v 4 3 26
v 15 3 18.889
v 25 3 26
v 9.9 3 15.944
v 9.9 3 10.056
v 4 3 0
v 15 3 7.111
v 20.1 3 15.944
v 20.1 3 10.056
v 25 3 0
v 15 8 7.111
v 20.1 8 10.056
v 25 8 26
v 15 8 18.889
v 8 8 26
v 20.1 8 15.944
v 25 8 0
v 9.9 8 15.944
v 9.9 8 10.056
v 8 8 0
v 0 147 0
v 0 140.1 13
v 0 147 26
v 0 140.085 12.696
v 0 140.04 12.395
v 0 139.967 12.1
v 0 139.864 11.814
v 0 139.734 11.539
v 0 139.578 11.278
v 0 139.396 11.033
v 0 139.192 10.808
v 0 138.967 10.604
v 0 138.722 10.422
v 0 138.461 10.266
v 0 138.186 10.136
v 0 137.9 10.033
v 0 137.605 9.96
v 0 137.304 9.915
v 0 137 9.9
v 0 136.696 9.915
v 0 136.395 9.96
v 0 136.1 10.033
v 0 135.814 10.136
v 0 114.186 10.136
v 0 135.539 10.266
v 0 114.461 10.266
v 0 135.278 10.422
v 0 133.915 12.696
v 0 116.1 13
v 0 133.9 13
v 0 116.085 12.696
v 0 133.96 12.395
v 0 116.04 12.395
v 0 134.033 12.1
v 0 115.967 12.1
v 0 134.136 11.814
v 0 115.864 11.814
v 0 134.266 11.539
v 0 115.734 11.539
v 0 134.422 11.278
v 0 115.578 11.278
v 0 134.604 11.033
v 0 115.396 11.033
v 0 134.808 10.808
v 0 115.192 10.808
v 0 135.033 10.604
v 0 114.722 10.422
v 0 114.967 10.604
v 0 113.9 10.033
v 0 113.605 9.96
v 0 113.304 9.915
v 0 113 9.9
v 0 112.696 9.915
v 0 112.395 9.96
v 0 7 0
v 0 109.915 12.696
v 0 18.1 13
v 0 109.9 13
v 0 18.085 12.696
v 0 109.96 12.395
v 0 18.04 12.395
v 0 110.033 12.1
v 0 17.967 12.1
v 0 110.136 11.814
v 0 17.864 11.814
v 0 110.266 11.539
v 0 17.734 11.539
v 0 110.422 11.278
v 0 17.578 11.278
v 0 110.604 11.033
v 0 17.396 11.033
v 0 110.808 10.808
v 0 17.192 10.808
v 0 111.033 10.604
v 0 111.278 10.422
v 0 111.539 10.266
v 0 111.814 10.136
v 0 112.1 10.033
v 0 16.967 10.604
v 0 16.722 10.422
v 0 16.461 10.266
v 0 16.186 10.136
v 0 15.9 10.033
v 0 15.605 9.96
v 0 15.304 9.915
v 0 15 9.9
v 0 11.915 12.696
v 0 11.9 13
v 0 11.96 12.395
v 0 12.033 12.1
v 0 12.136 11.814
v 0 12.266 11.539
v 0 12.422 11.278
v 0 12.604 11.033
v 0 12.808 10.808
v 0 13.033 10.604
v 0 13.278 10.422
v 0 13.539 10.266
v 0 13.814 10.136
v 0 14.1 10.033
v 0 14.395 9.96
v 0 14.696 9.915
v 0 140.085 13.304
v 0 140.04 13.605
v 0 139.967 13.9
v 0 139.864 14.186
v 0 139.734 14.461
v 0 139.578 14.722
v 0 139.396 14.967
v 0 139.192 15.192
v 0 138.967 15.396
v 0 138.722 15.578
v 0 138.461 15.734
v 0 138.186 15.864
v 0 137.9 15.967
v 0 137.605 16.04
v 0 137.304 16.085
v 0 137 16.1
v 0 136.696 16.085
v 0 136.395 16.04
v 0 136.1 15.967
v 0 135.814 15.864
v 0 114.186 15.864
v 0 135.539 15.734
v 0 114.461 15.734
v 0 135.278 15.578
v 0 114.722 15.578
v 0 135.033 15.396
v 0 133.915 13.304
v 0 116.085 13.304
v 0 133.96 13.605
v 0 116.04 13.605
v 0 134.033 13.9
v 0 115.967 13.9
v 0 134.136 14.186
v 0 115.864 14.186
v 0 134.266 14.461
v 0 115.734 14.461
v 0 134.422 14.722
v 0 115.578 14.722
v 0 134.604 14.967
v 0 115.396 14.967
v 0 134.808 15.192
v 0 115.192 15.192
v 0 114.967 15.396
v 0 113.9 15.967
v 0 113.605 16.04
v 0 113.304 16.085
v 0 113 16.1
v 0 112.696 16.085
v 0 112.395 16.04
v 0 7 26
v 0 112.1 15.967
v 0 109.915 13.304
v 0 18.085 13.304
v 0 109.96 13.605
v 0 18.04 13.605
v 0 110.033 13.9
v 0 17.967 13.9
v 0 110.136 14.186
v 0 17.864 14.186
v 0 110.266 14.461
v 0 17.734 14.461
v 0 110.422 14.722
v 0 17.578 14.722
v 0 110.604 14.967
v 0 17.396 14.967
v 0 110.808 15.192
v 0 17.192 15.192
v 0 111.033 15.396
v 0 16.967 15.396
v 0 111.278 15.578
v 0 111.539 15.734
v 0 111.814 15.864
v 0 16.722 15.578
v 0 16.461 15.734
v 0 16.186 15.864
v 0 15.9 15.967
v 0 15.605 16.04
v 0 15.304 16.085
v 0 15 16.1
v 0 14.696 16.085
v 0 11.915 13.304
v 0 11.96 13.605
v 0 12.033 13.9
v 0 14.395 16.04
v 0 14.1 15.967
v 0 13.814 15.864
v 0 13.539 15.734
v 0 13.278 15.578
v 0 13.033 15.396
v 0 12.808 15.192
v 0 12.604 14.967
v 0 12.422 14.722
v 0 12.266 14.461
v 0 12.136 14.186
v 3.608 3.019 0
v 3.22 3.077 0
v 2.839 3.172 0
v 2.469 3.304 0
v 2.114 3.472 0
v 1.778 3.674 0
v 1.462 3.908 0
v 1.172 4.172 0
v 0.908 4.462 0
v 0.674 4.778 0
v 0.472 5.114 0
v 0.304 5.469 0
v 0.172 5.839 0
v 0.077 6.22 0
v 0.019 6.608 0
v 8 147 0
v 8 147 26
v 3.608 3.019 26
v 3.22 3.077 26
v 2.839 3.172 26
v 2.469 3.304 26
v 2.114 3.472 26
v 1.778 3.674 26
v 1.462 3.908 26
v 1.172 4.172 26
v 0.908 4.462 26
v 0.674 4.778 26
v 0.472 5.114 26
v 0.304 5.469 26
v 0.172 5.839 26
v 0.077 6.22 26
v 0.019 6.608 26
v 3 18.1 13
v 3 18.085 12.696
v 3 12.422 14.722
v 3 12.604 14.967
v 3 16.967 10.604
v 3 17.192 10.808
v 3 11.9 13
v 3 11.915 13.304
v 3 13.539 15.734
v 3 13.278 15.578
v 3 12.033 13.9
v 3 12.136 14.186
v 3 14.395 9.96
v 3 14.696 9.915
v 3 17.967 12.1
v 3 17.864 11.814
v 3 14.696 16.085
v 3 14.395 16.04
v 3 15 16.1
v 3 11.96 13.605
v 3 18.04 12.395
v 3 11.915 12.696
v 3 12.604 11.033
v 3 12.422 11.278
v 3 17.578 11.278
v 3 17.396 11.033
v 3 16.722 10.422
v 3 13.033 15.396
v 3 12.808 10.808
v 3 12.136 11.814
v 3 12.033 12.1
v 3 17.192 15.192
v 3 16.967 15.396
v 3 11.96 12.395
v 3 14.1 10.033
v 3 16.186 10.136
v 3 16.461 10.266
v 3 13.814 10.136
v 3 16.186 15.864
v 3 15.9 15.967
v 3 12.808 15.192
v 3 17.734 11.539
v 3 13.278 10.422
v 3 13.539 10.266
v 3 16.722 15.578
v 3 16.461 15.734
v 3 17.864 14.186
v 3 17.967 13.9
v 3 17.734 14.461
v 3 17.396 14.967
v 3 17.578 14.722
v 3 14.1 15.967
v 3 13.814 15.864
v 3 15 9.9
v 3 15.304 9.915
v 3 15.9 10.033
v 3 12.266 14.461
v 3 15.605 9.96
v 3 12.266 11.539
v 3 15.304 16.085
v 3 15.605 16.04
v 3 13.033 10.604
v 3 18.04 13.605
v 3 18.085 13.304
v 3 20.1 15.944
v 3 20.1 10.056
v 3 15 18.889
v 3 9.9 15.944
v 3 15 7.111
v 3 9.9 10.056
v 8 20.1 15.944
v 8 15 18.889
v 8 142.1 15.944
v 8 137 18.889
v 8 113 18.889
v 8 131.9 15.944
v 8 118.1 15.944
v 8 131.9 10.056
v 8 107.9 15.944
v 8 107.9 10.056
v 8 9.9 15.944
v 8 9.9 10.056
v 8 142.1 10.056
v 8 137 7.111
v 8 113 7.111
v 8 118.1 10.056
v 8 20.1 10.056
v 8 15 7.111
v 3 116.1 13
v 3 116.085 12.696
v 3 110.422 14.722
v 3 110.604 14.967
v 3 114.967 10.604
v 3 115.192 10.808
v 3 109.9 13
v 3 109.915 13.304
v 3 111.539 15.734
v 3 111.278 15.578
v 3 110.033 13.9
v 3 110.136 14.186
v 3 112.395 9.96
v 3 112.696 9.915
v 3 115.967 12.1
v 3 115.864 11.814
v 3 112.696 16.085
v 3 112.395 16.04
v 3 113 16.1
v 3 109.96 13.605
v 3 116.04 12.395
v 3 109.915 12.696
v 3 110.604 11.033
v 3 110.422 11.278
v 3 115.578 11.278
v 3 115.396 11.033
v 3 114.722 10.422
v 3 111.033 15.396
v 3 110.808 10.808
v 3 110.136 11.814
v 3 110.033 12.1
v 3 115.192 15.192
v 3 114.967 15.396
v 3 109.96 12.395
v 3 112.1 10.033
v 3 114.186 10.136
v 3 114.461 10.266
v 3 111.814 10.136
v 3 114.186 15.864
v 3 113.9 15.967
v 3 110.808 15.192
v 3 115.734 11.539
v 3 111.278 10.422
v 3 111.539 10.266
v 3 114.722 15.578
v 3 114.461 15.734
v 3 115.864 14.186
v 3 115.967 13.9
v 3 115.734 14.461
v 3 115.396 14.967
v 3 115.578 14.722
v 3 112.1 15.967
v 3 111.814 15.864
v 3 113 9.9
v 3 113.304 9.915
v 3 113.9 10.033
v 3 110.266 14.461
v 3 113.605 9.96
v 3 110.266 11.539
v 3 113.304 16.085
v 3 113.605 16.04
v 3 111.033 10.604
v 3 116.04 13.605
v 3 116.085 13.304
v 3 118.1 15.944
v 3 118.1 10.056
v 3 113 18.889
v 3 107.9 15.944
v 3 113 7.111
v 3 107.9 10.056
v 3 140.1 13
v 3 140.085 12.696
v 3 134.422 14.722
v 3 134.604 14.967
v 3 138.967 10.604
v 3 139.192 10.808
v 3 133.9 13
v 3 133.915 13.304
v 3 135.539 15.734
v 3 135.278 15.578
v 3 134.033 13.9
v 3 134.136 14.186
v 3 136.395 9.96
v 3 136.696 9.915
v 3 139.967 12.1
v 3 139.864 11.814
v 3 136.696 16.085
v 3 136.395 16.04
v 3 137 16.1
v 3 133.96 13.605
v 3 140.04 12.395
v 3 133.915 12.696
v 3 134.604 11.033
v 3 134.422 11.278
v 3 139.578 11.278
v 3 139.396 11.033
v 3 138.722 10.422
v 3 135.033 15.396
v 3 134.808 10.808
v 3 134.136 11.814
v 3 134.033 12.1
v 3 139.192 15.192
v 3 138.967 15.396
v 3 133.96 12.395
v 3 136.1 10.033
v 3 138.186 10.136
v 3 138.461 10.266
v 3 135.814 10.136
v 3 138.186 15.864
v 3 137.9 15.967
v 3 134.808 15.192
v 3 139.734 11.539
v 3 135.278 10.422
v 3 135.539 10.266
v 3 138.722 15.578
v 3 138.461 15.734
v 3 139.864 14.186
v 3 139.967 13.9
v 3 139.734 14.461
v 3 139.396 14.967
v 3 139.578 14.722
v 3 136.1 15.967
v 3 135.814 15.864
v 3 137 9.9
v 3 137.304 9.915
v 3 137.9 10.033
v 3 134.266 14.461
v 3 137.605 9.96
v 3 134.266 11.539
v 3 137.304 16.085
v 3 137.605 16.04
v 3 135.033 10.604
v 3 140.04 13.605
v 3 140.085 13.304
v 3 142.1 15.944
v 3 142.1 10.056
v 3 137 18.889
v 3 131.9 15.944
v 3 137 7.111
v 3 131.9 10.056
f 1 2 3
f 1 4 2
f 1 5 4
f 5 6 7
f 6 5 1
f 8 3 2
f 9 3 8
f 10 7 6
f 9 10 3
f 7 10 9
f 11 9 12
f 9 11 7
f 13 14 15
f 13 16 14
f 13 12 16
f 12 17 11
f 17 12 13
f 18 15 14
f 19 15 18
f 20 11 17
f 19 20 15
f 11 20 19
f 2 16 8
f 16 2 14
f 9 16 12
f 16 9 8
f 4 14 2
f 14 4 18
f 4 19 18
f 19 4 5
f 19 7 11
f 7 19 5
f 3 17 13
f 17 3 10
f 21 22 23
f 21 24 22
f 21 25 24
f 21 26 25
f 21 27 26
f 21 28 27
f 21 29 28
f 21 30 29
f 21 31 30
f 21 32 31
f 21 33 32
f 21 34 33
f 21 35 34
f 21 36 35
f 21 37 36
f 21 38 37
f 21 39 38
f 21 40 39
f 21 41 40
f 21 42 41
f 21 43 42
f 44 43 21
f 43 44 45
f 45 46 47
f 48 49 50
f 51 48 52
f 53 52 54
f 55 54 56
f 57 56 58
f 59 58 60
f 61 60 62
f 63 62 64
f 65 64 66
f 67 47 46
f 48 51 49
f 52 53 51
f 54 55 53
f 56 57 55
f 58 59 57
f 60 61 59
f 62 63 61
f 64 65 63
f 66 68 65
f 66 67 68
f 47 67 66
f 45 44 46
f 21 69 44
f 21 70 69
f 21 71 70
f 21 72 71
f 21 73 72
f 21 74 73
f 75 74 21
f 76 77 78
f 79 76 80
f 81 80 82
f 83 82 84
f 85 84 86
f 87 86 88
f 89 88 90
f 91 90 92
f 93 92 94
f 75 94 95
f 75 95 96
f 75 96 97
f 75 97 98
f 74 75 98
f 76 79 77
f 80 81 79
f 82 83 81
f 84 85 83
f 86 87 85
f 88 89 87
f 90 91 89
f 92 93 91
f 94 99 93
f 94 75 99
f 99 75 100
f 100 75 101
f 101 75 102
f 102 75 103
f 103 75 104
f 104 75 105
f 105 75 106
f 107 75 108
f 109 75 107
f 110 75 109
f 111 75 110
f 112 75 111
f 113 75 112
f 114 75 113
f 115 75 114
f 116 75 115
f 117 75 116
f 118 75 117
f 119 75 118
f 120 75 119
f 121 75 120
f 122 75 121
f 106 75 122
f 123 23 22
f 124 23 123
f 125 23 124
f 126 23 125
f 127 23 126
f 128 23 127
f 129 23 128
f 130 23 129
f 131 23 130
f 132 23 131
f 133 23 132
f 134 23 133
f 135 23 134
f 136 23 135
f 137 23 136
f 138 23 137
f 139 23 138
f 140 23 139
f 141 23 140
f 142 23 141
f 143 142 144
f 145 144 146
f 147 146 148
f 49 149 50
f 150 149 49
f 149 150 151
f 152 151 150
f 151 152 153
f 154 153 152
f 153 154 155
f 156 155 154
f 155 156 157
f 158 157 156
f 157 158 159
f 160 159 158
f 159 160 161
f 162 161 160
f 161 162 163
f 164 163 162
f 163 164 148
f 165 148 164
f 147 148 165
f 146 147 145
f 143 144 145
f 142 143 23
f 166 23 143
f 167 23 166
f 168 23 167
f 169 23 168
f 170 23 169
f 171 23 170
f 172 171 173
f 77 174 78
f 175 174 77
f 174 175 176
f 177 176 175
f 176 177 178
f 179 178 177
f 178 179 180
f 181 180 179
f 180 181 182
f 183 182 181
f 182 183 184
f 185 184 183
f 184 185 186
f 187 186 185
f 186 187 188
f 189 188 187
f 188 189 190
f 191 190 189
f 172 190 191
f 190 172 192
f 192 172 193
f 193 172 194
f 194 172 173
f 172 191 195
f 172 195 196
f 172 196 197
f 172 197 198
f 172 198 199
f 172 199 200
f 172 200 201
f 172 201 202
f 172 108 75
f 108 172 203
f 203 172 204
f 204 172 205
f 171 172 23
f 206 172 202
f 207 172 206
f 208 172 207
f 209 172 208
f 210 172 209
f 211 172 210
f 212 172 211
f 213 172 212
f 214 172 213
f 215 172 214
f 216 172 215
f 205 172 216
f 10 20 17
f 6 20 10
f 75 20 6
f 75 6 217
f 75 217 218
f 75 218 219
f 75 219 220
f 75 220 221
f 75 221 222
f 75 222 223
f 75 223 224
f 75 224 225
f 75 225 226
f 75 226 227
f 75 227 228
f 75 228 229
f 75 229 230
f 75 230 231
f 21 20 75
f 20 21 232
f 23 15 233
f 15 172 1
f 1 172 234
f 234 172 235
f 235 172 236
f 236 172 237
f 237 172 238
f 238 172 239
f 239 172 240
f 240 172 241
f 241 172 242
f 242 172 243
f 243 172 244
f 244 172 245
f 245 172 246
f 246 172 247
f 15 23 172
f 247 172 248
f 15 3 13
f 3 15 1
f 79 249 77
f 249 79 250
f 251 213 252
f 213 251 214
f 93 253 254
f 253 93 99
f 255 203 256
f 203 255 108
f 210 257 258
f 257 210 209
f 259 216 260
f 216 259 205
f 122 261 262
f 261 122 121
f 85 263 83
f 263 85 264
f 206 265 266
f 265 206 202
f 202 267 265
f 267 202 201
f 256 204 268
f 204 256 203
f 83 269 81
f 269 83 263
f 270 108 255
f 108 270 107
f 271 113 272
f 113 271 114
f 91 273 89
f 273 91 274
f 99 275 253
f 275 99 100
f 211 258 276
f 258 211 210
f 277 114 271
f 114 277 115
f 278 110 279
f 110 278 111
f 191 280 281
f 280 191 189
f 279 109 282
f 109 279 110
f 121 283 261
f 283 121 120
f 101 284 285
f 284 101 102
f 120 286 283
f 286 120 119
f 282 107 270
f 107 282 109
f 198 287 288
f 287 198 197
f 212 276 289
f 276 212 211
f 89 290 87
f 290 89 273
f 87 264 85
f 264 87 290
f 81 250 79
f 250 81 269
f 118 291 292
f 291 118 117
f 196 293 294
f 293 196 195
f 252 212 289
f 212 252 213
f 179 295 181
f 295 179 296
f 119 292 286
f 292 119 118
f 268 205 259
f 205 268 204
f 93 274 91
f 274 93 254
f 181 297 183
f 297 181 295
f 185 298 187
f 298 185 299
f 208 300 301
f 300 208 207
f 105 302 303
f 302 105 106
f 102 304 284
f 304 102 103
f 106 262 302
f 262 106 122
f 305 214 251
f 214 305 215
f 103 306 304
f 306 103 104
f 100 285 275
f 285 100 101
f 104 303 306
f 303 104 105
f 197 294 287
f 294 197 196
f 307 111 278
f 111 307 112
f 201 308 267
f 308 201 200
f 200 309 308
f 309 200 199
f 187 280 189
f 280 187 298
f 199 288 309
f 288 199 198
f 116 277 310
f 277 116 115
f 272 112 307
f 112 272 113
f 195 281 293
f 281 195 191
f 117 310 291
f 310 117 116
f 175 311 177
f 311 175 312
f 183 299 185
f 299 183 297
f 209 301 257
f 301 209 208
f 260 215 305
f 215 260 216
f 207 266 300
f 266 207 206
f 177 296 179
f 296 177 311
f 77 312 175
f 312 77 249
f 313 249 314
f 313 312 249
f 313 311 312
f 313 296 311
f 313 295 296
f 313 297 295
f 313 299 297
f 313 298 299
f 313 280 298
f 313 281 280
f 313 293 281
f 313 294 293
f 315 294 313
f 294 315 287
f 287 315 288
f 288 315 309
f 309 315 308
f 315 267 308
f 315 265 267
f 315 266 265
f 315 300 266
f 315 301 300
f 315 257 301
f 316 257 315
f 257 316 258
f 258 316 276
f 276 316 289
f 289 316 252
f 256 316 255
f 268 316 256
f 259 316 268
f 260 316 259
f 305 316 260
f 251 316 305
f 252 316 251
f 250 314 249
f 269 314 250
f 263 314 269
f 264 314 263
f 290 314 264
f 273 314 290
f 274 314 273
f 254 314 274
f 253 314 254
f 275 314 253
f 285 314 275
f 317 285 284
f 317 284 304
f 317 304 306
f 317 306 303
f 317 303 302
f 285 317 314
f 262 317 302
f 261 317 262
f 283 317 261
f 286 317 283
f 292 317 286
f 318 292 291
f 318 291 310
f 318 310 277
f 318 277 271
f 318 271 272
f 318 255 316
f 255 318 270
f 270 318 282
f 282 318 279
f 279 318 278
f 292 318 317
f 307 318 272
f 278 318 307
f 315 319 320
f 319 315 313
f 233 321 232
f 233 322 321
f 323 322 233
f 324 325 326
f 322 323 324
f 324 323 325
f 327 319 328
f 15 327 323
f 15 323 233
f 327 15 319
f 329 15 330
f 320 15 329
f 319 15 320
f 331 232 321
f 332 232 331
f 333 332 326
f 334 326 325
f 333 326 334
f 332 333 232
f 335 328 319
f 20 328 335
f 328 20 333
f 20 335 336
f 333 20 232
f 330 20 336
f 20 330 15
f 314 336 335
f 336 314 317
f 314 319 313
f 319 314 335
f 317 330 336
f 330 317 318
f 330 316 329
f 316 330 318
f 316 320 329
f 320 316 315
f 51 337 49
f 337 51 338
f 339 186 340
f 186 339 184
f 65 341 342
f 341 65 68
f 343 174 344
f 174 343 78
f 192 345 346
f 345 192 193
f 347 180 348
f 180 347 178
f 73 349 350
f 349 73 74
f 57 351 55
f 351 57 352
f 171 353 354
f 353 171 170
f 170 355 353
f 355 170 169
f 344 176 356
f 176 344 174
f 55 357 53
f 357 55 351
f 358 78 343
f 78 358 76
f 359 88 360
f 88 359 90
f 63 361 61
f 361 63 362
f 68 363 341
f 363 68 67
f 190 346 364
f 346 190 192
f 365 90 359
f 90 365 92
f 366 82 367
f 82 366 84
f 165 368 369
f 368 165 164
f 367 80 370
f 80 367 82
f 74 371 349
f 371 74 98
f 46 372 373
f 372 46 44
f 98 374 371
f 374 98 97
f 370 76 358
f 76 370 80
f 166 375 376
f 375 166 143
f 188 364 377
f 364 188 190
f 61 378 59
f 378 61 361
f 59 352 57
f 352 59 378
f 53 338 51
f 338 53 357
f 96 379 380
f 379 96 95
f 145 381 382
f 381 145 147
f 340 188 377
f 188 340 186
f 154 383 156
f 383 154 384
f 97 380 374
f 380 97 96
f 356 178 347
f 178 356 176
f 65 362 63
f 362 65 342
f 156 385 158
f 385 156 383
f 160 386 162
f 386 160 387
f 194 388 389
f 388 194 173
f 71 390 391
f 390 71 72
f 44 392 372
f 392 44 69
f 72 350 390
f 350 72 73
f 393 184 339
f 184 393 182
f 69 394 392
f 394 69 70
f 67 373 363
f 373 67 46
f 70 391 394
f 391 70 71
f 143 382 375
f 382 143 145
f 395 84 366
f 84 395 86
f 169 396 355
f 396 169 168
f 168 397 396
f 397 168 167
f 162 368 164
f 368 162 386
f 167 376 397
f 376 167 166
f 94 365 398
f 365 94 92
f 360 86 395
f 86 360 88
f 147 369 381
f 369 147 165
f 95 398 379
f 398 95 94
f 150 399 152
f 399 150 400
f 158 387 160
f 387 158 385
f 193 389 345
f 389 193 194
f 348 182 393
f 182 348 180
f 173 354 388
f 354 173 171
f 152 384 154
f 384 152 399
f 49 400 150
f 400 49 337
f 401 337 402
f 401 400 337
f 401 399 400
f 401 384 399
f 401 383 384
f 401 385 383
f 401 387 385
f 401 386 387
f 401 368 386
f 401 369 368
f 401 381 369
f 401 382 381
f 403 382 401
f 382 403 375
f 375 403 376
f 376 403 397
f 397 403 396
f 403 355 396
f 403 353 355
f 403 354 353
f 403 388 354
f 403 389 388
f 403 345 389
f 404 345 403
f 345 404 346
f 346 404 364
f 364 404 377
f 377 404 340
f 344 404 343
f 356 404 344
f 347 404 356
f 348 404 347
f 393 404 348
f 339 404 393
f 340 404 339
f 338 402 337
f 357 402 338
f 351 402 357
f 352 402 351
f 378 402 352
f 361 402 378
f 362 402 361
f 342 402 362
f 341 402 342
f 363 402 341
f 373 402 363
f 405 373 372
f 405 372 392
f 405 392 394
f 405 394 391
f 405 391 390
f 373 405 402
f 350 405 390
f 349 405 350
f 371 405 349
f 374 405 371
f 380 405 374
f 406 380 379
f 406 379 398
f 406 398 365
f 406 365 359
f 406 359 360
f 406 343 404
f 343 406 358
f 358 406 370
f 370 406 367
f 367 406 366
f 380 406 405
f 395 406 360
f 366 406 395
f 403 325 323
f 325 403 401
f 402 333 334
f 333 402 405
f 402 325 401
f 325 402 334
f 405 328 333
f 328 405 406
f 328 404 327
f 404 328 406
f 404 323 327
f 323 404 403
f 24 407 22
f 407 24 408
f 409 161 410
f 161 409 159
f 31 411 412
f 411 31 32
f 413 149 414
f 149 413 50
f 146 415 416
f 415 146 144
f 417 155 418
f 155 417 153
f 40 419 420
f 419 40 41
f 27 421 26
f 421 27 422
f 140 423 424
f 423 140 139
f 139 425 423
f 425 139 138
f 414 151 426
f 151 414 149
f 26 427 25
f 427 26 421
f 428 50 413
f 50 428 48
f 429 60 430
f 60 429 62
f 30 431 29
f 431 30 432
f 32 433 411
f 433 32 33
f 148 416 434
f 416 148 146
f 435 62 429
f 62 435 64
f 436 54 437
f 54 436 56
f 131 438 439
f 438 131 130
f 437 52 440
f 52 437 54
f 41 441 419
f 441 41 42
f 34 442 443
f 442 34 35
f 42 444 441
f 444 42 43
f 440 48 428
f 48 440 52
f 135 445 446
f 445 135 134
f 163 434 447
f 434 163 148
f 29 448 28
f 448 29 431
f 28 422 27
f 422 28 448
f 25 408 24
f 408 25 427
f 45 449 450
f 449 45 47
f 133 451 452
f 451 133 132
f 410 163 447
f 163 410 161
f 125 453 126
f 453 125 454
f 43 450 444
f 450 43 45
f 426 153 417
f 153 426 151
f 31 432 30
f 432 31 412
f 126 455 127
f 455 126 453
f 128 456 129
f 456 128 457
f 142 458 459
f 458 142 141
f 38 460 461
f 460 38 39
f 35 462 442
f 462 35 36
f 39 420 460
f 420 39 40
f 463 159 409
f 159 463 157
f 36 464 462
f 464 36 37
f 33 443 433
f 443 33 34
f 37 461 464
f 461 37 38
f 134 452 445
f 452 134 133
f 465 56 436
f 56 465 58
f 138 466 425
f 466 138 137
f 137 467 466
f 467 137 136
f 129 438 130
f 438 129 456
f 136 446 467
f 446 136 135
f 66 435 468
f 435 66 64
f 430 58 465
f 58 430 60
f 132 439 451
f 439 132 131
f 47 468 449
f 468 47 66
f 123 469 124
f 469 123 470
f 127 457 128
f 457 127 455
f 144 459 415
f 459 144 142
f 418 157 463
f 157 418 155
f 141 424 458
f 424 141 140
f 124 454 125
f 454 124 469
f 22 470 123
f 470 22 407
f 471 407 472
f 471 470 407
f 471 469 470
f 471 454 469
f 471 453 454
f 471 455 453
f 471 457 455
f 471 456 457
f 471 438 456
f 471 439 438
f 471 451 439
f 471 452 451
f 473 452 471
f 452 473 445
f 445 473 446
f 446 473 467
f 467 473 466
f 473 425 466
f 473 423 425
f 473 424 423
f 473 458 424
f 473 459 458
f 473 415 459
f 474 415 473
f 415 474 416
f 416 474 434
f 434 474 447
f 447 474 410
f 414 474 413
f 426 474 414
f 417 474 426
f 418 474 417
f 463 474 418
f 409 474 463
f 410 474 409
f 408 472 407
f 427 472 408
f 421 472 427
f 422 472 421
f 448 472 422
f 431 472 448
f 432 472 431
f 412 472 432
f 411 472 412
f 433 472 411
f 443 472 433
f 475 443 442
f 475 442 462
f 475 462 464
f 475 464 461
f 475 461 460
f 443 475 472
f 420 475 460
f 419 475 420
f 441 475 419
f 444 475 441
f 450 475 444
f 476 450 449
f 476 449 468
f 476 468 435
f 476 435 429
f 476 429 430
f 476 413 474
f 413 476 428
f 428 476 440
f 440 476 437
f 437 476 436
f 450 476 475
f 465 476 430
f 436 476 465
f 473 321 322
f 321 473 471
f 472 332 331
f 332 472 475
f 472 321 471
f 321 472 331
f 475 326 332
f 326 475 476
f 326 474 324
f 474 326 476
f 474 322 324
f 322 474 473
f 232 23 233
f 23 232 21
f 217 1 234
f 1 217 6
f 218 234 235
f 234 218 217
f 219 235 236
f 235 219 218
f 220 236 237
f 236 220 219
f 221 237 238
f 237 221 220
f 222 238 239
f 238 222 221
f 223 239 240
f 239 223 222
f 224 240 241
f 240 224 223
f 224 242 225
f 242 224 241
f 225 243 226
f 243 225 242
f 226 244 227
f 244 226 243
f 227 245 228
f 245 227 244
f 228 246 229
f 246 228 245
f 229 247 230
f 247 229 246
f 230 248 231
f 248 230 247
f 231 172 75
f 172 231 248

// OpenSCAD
// file: ../../../modules/bolts.scad
module nut_trap(d, h, center = true) {
  linear_extrude(height = h, center = center)
  circle(d = d / cos(30), $fn = 6);
}

module bolt_hole(d, h, center = true) {
  linear_extrude(height = h, center = center)
  circle(d = d, $fn = 64);
}

// Hex holes for self-tapping (nominal - 0.2mm)
module hex_hole(flat_d, h) {
  linear_extrude(height = h, center = true)
  circle(d = flat_d / cos(30), $fn = 6);
}

module m3_bolt_hexhole(h) {
  rotate([0, 0, 90])
  hex_hole(flat_d = 2.8, h = h);
}

module m4_bolt_hexhole(h) {
  rotate([0, 0, 90])
  hex_hole(flat_d = 3.8, h = h);
}

module m6_bolt_hexhole(h) {
  rotate([0, 0, 90])
  hex_hole(flat_d = 5.8, h = h);
}

module m8_bolt_hexhole(h) {

  rotate([0, 0, 90])

  hex_hole(flat_d = 7.8, h = h);

}





// --- Size-specific, separated modules for flexible placement ---



// M3

module m3_bolt_hole(h, center = false) {

  bolt_hole(d = 3.4, h = h, center = center);

}

module m3_nut_trap(h, center = false) {

  nut_trap(d = 5.7, h = h, center = center);

}



// M4

module m4_bolt_hole(h, center = false) {

  bolt_hole(d = 4.4, h = h, center = center);

}

module m4_nut_trap(h, center = false) {

  nut_trap(d = 7.5, h = h, center = center);

}



// M6

module m6_bolt_hole(h, center = false) {

  bolt_hole(d = 6.2, h = h, center = center);

}

module m6_nut_trap(h, center = false) {

  nut_trap(d = 10.2, h = h, center = center);

}



// M8

module m8_bolt_hole(h, center = false) {

  bolt_hole(d = 8.4, h = h, center = center);

}

module m8_nut_trap(h, center = false) {

  nut_trap(d = 13.3, h = h, center = center);

}
// main file
use <../../../modules/bolts.scad>;
width = 147;
height = 26;
deps = 8;
radius = 4;

difference() {
  union(){
    translate([0, 0, height])
    rotate([90, 180, 180])
    short_bar(25, height, deps);
    
    translate([0, 0, 0])
    rotate([90, 0, 90])
    long_bar(width, height, deps);
  }

  translate([deps / 2, deps / 2 + 3, 0])
  rotate([0, 0, 180])
  fillet_profile(radius, height * 2 + 1);
  
  translate([deps / 2, 0, 0])
  cube([50, 6, height * 2 + 1], center = true);
}

module fillet_profile(r, h) {
  linear_extrude(height = h, center = true)
  difference() {
    square([r, r]);
    circle(r = r, $fn = 64);
  }
}

module short_bar (w, y, h) {
  difference() {
    translate([w / 2, y / 2, h / 2])
    cube([w, y, h], center=true);

    translate([15, y / 2, 0])
    union() {
        nut_thickness = 5; // M6 nut height

        // Replicates hole from z~0 to z~h
        translate([0, 0, h / 2])
        m6_bolt_hole(h + 1, center = true);

        // Replicates nut trap at the top surface (from z=h-thickness to z=h)
        translate([0, 0, h - nut_thickness / 2])
        rotate([0, 0, 90])
        m6_nut_trap(nut_thickness, center = true);
    };
  }
}

module long_bar (w, y, h) {
  difference() {
    translate([w / 2, y / 2, h / 2])
    cube([w, y, h], center=true);

    translate([15, y / 2, 0])
    union() {
        nut_thickness = 5; // M6 nut height

        // Replicates hole from z~0 to z~h
        translate([0, 0, h / 2])
        m6_bolt_hole(h + 1, center = true);

        // Replicates nut trap at the top surface (from z=h-thickness to z=h)
        translate([0, 0, h - nut_thickness / 2])
        rotate([0, 0, 90])
        m6_nut_trap(nut_thickness, center = true);
    };
    translate([15 + 98, y / 2, 0])
    union() {
        nut_thickness = 5; // M6 nut height

        // Replicates hole from z~0 to z~h
        translate([0, 0, h / 2])
        m6_bolt_hole(h + 1, center = true);

        // Replicates nut trap at the top surface (from z=h-thickness to z=h)
        translate([0, 0, h - nut_thickness / 2])
        rotate([0, 0, 90])
        m6_nut_trap(nut_thickness, center = true);
    };
    translate([15 + 98 + 24, y / 2, 0])
    union() {
        nut_thickness = 5; // M6 nut height

        // Replicates hole from z~0 to z~h
        translate([0, 0, h / 2])
        m6_bolt_hole(h + 1, center = true);

        // Replicates nut trap at the top surface (from z=h-thickness to z=h)
        translate([0, 0, h - nut_thickness / 2])
        rotate([0, 0, 90])
        m6_nut_trap(nut_thickness, center = true);
    };
  }
}
